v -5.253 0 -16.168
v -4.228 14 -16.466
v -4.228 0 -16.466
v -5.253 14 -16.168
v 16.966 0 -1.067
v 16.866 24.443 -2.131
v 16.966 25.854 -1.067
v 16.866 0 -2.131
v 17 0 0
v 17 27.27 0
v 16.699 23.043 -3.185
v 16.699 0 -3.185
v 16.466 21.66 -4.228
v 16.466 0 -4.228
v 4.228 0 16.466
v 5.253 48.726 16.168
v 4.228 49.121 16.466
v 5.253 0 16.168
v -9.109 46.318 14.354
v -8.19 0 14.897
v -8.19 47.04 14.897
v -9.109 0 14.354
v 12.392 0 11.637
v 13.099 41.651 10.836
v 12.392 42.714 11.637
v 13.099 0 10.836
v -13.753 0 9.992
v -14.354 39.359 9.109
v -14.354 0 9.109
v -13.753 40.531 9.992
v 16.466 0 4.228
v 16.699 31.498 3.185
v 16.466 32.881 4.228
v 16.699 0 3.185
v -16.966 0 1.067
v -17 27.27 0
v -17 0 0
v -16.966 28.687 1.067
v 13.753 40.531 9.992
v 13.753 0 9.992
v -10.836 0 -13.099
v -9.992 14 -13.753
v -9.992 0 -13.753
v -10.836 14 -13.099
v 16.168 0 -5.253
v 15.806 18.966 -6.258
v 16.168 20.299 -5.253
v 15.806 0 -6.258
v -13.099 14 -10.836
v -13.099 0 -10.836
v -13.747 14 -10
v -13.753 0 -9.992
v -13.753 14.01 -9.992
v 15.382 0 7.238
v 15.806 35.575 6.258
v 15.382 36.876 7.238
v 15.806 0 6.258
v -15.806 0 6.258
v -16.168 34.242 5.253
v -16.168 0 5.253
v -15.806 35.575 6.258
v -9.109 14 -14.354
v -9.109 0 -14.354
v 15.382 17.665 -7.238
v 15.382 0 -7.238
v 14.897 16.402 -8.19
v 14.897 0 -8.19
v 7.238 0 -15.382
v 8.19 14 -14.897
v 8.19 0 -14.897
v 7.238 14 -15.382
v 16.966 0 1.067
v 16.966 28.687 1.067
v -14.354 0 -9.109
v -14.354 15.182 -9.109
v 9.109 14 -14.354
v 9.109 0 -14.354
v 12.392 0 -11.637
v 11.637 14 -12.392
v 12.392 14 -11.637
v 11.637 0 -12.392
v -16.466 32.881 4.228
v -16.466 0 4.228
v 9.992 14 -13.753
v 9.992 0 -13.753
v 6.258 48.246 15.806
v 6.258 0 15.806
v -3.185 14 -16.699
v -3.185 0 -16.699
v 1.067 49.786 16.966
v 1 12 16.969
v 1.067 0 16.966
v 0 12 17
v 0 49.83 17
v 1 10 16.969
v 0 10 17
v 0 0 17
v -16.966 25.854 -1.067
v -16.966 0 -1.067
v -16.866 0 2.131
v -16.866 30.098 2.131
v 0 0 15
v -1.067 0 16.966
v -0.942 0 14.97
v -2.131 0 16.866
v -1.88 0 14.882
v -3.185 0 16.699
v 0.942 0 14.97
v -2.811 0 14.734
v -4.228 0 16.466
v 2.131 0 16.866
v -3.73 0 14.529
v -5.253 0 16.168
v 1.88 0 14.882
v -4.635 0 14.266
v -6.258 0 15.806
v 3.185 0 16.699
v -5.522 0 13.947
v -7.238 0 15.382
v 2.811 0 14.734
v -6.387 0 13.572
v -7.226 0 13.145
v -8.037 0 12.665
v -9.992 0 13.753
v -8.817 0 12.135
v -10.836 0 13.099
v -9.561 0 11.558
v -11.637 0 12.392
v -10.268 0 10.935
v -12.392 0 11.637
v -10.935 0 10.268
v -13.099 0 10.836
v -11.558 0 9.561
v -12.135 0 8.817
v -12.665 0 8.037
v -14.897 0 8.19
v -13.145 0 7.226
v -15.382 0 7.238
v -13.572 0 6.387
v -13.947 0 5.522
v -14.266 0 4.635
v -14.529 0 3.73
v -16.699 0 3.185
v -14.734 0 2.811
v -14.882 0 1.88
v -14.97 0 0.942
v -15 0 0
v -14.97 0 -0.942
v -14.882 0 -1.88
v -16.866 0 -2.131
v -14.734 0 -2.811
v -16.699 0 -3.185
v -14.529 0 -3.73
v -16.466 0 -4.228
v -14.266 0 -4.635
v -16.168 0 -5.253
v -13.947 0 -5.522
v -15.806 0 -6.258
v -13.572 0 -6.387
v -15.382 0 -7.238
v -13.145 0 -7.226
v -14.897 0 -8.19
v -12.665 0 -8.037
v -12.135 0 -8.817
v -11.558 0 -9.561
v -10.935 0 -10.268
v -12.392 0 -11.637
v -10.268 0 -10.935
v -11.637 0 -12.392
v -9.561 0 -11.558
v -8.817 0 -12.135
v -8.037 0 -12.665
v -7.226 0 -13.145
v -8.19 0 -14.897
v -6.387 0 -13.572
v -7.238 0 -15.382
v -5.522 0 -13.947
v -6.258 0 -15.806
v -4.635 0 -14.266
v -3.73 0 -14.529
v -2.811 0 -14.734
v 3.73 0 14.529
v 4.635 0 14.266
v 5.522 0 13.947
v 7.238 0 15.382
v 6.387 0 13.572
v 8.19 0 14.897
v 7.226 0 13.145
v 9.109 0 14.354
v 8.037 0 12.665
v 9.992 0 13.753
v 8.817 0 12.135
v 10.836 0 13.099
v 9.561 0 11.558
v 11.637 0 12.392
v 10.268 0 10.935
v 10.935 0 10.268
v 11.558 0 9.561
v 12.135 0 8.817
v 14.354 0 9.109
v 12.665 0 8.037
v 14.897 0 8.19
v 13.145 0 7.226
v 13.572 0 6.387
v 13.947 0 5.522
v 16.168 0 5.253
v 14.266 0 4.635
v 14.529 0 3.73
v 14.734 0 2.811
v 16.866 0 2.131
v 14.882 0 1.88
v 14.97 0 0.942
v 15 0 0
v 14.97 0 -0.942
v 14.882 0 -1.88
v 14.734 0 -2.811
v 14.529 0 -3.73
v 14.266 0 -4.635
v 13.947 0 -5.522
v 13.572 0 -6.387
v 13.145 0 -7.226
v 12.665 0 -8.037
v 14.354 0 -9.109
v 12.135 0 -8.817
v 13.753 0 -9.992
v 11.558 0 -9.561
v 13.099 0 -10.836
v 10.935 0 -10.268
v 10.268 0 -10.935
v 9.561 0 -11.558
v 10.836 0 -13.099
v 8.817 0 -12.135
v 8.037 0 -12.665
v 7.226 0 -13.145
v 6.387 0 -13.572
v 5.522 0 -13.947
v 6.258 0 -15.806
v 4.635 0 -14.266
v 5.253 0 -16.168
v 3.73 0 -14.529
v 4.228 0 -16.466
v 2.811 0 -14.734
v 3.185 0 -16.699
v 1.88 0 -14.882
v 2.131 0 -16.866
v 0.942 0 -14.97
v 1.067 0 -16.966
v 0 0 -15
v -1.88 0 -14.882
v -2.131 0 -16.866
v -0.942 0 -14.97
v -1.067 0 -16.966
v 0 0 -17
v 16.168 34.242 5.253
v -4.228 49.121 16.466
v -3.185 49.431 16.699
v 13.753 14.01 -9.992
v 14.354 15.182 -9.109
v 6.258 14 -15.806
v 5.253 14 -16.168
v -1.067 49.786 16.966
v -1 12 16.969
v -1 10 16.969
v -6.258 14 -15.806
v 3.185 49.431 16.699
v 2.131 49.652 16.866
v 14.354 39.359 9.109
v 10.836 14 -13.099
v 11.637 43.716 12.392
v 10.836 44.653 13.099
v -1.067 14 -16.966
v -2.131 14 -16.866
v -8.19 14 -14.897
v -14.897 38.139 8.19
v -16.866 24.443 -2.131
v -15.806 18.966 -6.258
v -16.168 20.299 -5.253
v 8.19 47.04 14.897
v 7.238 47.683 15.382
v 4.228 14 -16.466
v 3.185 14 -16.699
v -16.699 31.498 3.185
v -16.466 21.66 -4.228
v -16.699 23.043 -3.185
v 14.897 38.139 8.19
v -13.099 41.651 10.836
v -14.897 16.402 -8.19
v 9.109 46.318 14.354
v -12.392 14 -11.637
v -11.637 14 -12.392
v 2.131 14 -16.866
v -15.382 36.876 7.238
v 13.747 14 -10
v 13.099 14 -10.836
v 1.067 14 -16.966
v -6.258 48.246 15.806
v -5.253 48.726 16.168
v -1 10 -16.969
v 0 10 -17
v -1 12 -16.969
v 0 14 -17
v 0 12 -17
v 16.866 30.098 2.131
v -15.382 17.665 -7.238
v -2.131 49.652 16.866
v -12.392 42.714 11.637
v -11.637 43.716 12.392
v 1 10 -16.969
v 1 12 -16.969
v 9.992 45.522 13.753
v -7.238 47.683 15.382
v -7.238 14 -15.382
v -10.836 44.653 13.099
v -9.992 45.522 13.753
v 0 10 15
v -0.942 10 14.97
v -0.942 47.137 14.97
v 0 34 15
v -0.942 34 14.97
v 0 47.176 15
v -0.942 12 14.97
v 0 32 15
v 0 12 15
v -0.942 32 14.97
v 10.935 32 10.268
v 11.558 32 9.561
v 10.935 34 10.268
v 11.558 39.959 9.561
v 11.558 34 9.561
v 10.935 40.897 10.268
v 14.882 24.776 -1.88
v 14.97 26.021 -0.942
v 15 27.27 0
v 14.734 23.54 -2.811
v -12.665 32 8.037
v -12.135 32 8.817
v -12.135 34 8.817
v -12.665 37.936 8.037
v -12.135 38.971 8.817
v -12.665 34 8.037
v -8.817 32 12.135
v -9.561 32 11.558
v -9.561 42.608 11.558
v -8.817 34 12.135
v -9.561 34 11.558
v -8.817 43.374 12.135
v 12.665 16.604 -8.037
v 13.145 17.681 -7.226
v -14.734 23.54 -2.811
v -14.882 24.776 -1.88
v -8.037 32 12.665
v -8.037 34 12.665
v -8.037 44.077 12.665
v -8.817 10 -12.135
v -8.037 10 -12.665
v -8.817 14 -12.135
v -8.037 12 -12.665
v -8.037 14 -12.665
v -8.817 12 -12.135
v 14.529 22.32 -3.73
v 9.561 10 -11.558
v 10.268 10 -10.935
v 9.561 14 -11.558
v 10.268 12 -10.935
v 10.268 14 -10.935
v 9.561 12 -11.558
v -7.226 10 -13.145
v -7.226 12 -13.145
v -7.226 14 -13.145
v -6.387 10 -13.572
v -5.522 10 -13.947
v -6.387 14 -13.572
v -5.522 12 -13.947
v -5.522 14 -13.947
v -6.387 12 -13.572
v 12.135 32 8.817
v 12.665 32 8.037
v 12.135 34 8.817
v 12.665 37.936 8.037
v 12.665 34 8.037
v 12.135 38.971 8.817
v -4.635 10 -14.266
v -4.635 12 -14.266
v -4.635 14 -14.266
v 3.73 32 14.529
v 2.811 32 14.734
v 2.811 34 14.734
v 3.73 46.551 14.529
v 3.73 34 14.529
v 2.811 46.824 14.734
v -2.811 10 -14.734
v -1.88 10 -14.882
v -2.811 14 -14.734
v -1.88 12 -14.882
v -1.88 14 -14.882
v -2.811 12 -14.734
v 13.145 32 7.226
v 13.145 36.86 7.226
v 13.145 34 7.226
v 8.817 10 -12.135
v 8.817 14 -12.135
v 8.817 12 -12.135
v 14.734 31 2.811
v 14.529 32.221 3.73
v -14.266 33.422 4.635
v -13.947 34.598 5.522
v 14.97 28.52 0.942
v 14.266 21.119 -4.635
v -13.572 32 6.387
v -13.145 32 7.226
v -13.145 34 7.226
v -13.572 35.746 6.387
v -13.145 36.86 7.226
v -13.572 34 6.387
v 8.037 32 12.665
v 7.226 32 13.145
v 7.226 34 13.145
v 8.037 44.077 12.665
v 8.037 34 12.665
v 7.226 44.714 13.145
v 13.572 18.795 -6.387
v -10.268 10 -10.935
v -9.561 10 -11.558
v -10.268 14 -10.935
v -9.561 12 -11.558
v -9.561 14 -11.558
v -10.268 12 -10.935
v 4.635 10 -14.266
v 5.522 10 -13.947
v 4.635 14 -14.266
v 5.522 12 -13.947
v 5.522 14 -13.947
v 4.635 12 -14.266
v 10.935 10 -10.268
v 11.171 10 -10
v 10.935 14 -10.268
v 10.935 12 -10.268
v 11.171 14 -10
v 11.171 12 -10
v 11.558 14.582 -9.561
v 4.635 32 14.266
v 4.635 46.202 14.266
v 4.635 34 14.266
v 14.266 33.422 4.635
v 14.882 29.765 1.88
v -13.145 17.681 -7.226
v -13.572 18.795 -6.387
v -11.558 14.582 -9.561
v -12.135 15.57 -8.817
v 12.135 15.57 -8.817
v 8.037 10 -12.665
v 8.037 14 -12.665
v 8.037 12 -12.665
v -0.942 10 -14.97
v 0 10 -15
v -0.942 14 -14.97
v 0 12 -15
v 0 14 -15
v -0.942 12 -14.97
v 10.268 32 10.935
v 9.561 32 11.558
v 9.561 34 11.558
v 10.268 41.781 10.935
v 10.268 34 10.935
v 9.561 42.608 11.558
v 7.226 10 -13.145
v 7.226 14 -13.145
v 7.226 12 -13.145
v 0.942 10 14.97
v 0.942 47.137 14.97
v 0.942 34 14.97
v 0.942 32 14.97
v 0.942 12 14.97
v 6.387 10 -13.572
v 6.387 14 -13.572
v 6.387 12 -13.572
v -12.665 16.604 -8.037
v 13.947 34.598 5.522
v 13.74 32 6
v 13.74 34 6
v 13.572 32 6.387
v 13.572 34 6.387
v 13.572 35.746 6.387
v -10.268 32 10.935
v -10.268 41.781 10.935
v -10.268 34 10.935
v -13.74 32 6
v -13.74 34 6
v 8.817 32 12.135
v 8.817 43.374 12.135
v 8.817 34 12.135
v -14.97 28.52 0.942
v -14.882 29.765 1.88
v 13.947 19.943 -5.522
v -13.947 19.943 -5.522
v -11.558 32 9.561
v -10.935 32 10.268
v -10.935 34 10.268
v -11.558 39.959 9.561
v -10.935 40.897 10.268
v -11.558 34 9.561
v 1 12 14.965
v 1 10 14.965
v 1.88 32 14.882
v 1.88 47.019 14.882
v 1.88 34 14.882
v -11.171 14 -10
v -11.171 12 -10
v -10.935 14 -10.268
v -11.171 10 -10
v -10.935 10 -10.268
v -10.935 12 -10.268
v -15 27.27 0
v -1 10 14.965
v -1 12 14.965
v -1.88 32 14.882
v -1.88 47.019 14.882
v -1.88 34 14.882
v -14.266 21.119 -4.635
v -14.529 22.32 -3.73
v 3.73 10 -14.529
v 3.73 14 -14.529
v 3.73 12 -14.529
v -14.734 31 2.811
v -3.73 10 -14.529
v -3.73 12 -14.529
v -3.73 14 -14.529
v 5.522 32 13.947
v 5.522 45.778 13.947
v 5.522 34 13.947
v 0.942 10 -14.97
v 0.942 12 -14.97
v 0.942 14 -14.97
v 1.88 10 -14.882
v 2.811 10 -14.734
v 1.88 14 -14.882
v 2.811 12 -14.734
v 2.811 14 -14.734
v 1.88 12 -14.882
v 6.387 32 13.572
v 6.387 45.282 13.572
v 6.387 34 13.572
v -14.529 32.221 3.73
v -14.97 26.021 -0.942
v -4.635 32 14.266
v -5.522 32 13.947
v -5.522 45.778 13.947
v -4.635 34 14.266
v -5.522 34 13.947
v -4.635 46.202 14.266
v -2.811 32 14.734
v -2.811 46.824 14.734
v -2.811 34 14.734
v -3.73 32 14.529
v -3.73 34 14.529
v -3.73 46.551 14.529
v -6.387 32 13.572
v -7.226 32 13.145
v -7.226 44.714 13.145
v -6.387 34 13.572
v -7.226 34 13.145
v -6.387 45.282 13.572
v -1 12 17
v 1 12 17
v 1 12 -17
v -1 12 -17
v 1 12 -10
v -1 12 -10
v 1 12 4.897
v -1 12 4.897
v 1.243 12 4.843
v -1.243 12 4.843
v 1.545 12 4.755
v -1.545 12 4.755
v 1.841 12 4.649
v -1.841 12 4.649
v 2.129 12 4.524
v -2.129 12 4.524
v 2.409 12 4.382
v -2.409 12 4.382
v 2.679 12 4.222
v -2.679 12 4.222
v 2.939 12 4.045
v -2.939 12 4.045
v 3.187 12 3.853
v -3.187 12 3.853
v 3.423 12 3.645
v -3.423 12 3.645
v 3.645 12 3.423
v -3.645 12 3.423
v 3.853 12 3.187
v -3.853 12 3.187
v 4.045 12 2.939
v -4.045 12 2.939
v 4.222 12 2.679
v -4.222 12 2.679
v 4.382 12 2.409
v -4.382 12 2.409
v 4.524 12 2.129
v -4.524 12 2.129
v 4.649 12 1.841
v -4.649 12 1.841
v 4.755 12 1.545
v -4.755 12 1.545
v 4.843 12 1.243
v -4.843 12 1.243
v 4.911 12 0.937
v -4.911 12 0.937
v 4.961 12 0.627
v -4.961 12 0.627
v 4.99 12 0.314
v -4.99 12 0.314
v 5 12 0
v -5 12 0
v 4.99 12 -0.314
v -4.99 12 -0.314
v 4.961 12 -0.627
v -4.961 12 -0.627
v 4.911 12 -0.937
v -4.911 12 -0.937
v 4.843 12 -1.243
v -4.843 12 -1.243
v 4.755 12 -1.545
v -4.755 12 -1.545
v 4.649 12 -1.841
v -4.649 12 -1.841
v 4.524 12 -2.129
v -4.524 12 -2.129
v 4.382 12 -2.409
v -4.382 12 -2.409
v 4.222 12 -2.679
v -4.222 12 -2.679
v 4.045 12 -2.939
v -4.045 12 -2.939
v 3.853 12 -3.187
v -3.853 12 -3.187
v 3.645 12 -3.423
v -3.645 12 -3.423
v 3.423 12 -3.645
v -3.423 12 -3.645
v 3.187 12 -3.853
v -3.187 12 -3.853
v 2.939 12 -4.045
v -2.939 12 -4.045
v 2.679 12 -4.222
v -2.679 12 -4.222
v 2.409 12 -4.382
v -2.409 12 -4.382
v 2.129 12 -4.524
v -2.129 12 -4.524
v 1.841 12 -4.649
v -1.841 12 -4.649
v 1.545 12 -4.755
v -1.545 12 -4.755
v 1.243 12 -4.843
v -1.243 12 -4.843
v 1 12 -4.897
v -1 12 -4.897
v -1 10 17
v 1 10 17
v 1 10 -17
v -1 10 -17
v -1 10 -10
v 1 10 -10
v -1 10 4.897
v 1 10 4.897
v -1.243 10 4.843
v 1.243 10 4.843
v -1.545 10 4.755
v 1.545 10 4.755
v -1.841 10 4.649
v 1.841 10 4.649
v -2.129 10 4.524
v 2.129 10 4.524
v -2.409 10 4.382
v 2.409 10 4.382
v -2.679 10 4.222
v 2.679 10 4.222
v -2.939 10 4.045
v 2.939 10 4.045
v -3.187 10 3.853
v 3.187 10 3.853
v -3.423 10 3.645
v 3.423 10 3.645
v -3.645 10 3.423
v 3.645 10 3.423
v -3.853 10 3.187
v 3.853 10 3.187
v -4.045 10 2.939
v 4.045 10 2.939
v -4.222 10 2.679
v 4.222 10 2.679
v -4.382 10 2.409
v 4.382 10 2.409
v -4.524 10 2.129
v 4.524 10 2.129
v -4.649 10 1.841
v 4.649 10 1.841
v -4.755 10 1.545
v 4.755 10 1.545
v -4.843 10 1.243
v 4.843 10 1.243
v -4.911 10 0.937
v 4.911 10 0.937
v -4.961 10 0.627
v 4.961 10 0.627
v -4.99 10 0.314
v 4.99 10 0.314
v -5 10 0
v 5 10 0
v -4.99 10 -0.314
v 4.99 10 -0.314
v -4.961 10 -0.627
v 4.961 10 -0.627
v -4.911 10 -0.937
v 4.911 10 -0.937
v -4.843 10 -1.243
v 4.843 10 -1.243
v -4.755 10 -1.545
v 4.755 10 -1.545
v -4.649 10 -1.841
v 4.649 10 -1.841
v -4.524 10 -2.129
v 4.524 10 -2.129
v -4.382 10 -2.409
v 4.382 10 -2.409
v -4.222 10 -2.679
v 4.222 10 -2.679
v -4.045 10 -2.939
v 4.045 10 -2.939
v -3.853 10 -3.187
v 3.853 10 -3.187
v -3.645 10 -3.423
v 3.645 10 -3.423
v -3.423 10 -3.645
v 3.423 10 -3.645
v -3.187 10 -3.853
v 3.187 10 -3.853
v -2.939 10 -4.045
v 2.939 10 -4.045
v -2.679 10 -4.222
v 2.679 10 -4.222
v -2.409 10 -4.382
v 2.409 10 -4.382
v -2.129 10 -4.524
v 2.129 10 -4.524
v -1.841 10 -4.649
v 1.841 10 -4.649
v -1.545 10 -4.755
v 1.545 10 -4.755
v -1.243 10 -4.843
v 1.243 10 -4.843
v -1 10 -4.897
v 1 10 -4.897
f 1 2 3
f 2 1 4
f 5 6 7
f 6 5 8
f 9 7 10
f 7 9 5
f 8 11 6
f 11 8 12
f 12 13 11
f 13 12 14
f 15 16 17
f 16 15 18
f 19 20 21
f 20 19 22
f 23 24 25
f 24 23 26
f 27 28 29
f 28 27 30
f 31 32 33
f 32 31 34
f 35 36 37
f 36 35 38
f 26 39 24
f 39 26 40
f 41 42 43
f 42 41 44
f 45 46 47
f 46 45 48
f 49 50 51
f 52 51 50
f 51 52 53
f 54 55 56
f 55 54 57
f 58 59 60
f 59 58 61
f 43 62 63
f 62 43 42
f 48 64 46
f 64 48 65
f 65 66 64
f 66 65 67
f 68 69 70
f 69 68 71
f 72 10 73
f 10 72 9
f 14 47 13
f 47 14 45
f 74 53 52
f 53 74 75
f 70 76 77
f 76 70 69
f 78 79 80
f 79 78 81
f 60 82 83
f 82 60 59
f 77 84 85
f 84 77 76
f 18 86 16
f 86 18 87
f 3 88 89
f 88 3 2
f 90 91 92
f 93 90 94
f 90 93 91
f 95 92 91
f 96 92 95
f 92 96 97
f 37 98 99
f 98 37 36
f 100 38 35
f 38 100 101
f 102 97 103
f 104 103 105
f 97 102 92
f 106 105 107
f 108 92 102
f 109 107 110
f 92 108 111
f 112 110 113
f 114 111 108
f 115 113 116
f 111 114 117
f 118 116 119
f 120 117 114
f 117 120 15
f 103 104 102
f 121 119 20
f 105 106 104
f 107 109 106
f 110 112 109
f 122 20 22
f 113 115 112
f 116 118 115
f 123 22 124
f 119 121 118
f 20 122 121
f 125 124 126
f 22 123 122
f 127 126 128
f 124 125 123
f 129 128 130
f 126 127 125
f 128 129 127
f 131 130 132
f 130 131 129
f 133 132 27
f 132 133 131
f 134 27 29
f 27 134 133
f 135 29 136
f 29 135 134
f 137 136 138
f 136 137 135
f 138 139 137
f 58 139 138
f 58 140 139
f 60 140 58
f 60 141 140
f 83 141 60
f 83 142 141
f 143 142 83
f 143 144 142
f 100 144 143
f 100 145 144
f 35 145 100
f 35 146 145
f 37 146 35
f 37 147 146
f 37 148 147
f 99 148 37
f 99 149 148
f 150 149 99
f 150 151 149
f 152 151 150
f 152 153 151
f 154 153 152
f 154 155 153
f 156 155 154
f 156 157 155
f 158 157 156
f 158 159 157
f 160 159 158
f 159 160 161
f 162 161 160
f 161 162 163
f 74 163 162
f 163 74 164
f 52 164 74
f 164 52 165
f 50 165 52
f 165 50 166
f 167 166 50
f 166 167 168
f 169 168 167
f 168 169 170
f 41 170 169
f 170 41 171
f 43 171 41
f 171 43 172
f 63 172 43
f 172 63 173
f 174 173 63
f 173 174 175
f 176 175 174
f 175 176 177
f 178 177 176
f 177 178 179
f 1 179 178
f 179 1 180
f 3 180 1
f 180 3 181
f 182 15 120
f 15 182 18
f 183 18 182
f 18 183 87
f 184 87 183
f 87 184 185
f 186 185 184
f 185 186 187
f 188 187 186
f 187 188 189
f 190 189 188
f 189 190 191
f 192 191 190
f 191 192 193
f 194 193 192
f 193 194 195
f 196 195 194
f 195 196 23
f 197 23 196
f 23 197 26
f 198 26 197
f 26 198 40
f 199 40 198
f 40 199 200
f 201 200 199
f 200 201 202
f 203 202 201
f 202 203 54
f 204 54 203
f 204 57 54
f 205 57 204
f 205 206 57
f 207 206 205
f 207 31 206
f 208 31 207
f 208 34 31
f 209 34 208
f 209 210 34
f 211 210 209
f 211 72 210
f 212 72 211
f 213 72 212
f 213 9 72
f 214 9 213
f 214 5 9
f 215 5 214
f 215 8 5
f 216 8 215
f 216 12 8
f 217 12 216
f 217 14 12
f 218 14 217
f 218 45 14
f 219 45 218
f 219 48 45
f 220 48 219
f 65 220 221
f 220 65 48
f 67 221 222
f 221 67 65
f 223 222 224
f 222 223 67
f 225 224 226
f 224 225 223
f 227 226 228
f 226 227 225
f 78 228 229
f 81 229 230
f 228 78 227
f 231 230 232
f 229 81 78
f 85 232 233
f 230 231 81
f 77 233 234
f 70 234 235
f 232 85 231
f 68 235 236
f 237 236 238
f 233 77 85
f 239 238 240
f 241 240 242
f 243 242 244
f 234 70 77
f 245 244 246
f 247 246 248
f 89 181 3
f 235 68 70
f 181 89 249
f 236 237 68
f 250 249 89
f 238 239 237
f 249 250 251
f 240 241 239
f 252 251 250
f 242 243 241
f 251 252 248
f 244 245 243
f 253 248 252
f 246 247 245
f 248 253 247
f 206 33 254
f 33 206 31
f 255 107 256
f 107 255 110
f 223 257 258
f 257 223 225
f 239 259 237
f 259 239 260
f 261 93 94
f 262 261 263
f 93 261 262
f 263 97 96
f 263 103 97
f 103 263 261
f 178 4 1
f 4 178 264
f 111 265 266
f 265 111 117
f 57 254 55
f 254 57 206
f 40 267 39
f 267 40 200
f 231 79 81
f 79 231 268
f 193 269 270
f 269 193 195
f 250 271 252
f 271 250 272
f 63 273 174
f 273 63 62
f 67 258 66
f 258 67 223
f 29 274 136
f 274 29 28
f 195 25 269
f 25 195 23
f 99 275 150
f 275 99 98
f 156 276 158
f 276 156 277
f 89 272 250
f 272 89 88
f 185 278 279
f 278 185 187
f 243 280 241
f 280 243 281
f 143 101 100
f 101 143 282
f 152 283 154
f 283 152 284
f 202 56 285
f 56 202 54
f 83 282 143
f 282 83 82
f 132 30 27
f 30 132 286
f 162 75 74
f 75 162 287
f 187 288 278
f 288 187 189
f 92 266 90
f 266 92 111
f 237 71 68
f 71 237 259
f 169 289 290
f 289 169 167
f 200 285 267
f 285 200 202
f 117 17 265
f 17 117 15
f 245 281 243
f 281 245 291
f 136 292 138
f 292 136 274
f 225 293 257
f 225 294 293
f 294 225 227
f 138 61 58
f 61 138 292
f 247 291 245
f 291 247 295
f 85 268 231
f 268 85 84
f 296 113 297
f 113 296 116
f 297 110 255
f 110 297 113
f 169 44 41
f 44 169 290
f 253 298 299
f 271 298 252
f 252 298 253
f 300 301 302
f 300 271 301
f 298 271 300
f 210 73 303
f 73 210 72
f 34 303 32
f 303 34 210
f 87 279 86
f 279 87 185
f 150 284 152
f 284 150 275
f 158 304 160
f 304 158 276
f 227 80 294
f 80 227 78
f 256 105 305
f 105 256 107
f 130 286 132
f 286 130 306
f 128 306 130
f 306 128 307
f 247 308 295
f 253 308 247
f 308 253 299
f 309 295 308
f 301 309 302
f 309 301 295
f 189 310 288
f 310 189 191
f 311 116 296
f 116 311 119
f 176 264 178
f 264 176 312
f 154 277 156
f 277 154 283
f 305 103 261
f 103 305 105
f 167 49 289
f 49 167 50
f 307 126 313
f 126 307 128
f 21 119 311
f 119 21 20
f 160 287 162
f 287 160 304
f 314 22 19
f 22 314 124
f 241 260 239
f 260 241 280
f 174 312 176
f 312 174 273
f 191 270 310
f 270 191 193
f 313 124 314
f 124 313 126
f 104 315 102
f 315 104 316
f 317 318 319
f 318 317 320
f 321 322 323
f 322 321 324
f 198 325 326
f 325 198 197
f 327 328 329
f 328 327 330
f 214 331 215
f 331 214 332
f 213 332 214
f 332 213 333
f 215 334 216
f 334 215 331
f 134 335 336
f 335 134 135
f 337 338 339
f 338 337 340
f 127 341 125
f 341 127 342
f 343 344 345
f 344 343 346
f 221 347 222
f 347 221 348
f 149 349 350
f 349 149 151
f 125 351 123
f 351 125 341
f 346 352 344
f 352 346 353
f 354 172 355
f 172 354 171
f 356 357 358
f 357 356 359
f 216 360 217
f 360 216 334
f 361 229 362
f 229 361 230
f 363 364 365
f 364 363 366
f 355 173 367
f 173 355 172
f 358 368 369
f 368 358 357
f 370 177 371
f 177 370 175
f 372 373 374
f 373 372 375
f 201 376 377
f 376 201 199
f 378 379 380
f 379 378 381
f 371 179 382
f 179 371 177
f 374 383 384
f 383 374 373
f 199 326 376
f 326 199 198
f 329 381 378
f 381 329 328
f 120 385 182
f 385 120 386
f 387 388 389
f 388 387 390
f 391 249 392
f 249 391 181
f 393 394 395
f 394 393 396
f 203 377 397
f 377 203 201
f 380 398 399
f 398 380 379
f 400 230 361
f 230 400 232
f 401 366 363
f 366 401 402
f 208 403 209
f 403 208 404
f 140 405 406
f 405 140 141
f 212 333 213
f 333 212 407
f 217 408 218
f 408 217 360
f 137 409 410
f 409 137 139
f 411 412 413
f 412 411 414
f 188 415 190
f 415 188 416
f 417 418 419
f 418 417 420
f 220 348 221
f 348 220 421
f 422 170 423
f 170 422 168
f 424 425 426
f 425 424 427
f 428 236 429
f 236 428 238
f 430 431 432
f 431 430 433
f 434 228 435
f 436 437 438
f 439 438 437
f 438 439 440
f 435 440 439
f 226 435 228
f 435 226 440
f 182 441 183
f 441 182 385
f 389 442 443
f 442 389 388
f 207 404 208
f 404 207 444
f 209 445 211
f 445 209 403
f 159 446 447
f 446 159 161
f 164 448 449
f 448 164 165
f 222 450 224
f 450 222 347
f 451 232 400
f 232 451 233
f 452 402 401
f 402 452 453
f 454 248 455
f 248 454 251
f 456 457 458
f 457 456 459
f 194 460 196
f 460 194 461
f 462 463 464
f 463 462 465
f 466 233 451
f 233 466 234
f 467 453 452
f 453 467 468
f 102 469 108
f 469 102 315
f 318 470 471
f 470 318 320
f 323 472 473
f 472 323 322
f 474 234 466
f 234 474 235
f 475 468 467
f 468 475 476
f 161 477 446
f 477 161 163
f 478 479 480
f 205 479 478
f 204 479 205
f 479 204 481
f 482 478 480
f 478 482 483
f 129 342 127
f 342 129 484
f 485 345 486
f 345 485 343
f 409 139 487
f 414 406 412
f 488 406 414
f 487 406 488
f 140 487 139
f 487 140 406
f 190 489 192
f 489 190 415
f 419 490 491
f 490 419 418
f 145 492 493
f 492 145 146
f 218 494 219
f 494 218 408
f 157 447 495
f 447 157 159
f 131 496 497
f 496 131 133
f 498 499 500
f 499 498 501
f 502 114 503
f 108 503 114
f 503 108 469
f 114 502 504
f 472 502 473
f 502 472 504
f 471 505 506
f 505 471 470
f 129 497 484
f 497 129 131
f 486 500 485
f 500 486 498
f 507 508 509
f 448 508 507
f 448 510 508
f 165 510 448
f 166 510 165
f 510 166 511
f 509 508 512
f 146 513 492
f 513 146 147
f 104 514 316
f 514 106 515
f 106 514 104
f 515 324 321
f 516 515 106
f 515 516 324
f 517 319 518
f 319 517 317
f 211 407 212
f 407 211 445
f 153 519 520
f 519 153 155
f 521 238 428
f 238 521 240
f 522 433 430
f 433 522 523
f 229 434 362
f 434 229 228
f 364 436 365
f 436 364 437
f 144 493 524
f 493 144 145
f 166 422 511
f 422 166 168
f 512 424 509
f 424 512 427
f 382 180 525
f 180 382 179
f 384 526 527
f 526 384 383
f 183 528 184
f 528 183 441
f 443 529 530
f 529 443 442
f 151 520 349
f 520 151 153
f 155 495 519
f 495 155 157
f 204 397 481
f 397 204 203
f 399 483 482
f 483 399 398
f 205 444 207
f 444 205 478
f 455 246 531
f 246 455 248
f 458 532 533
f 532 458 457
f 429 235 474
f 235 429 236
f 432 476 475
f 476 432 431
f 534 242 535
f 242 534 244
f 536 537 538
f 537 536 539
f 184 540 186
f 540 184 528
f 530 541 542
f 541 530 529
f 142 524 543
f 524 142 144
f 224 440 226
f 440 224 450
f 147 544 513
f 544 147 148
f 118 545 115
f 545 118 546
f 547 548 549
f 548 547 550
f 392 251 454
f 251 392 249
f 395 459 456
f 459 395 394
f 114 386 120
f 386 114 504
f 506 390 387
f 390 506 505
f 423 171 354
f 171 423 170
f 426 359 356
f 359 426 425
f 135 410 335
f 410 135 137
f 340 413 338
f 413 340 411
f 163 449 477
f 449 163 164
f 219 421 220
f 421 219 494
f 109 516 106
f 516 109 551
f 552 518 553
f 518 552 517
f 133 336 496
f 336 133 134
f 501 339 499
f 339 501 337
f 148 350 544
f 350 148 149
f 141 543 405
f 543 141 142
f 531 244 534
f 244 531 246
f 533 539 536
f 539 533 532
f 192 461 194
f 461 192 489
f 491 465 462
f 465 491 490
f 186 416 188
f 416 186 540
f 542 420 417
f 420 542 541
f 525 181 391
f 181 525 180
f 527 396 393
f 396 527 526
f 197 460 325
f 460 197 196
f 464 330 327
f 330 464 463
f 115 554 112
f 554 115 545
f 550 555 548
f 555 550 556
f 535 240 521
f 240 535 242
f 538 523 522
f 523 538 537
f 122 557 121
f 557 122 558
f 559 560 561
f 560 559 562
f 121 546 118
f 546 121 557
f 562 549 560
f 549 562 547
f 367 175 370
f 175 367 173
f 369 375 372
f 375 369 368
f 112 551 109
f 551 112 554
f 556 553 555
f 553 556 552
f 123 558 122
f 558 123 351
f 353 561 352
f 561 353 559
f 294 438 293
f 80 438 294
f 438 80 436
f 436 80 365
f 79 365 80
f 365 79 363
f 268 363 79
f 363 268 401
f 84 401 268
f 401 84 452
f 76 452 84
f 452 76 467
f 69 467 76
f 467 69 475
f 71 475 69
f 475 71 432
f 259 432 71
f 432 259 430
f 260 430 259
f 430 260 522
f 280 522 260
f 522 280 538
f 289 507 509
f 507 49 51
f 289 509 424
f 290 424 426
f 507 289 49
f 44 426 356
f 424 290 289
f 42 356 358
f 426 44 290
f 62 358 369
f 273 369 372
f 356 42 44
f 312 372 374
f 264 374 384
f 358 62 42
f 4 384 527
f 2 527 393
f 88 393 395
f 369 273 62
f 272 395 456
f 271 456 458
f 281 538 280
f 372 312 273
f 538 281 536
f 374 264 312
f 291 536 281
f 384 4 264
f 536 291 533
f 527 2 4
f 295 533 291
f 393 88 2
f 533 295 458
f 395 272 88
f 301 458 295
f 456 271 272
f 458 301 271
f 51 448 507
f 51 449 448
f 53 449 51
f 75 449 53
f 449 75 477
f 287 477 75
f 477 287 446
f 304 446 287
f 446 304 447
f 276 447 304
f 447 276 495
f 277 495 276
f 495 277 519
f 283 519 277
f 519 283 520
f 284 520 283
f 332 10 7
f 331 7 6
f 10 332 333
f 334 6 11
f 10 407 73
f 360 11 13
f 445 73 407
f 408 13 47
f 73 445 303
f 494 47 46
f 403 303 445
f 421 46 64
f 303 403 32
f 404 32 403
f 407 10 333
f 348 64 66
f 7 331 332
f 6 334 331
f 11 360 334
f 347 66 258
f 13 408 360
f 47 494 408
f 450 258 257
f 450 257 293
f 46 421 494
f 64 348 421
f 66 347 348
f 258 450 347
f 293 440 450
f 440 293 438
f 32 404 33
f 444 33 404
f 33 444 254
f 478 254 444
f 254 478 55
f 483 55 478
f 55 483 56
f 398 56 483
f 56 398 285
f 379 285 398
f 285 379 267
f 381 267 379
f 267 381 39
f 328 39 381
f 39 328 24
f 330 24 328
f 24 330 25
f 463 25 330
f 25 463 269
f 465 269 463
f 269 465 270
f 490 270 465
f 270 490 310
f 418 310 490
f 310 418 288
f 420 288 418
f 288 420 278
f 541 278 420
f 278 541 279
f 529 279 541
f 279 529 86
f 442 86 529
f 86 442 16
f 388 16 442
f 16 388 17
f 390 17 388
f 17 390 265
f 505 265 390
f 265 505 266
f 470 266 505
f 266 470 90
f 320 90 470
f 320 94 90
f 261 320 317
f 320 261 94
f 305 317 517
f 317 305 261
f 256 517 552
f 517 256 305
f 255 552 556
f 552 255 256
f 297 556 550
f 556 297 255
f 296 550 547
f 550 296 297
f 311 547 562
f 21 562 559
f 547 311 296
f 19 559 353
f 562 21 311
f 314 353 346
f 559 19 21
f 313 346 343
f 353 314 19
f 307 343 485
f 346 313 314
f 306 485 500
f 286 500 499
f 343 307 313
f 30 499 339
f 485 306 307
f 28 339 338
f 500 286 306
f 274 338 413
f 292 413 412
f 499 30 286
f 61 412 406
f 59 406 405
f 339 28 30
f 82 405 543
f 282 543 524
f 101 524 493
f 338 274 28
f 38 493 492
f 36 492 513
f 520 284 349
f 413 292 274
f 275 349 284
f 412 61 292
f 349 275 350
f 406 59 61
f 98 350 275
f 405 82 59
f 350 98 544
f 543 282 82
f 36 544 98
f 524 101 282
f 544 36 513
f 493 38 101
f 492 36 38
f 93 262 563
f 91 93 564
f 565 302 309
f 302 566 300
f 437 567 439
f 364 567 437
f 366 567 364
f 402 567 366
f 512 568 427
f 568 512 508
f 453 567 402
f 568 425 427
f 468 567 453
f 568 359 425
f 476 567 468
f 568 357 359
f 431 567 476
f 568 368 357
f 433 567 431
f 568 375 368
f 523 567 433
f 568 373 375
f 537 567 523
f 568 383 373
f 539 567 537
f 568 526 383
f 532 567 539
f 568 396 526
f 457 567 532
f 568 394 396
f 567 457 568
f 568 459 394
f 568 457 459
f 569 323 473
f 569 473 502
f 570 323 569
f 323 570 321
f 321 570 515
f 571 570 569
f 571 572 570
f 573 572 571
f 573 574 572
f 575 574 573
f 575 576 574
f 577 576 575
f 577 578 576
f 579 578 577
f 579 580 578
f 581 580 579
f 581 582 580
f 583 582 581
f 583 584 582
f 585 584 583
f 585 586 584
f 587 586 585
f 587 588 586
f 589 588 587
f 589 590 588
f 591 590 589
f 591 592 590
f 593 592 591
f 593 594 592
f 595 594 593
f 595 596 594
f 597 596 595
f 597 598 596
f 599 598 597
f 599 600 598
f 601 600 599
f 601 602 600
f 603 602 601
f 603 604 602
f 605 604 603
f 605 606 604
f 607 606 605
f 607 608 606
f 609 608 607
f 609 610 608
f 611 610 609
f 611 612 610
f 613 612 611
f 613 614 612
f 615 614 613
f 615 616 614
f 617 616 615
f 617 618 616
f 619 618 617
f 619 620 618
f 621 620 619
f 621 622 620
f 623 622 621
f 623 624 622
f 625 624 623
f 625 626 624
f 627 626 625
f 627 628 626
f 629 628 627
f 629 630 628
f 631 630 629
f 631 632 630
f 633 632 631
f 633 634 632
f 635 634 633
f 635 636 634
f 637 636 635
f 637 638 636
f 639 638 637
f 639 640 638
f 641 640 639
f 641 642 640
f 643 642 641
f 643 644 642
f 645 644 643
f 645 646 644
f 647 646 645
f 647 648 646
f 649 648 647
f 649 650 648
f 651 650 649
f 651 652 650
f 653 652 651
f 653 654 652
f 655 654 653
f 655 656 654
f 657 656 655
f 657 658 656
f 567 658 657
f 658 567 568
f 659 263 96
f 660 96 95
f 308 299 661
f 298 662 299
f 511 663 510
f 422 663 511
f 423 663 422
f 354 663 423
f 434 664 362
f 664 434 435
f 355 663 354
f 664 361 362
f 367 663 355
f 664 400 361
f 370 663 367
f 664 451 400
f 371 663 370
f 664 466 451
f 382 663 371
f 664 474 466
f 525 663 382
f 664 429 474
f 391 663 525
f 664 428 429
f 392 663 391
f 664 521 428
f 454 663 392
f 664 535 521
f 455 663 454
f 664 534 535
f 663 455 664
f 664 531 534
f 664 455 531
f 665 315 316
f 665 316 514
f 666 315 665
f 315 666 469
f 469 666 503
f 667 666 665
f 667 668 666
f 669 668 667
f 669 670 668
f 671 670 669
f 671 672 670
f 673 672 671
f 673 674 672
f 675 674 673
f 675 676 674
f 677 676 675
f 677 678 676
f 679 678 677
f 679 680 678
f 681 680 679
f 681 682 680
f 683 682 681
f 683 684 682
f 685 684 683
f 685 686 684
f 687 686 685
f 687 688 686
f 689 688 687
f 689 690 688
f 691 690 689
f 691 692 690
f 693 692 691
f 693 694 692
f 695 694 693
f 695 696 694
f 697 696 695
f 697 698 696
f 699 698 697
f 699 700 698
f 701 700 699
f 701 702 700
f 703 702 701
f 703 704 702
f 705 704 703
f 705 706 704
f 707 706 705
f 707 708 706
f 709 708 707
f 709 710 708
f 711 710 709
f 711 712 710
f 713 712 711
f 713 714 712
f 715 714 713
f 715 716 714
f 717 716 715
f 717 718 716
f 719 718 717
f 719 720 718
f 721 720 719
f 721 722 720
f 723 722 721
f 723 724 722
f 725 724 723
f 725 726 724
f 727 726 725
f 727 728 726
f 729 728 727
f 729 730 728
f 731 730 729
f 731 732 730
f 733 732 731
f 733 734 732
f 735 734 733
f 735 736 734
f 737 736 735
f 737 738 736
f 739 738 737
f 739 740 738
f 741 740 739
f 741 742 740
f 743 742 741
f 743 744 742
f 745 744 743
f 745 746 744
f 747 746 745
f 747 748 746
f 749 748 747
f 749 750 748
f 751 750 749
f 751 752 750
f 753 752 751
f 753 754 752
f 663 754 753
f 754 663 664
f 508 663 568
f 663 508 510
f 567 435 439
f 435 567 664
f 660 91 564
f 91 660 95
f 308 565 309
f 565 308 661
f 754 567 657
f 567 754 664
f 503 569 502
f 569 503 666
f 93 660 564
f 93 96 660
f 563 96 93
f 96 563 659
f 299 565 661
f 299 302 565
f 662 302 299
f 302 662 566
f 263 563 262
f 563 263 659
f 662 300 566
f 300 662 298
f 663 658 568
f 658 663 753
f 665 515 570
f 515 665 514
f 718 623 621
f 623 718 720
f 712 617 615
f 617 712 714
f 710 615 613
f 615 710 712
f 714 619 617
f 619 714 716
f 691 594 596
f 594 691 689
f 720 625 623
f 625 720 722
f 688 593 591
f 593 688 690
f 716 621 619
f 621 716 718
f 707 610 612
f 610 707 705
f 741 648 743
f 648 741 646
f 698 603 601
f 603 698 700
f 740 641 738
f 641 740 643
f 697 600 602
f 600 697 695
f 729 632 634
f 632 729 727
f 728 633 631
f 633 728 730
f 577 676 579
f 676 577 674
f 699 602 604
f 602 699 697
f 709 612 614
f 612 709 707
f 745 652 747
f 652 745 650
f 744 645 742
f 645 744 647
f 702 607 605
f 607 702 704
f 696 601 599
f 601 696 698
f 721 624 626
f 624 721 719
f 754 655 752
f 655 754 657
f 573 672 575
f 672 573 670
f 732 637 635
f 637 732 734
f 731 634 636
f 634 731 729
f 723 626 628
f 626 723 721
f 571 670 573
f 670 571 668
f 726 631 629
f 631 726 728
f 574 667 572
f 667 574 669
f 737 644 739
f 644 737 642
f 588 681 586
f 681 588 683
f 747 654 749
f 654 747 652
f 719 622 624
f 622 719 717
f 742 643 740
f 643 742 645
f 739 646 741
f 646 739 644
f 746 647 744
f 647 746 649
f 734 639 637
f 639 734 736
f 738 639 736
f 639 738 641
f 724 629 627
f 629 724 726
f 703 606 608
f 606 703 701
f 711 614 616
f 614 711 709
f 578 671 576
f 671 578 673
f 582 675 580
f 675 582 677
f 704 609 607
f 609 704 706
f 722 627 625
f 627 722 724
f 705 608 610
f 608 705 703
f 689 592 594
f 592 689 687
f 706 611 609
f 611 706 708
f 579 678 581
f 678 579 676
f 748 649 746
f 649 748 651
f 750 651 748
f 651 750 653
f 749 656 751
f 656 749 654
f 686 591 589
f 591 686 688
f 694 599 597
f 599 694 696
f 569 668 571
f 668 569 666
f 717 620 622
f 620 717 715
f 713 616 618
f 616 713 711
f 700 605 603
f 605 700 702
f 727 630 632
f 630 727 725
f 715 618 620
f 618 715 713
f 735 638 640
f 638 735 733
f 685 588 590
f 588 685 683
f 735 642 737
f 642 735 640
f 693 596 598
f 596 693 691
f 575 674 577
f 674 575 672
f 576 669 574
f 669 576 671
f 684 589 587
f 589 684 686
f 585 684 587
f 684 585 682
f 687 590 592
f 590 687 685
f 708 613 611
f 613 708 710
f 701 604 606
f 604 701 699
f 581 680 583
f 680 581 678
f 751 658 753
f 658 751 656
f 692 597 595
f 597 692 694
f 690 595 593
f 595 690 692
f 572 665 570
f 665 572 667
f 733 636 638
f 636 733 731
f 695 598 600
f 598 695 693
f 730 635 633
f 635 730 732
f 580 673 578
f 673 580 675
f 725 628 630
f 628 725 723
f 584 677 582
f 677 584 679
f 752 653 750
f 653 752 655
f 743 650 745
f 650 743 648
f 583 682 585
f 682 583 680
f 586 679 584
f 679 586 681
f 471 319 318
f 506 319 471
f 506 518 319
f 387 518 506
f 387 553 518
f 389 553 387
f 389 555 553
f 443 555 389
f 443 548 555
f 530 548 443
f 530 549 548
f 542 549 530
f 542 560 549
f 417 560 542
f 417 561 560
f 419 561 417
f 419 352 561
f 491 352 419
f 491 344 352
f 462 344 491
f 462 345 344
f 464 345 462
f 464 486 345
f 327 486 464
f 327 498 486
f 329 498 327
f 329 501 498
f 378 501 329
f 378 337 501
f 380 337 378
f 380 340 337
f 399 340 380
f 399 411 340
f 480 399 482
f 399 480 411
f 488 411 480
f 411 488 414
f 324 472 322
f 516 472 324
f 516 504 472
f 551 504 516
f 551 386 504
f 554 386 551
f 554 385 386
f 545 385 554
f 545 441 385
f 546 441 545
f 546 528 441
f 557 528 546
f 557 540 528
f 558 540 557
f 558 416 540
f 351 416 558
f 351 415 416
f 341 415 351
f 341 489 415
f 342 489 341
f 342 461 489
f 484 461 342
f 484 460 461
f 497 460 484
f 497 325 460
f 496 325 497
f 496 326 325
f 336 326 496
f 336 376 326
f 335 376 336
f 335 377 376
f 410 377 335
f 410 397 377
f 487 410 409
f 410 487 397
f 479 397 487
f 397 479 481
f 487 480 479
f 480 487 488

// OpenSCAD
//
// ktRACK95
//
//

gap1 = 0.001;
gap2 = 0.003;
th = 2;




//base();
awning();


module awning()
{
difference()
{

    union()
    {
        translate([0, 0, 0]) rotate([-90, 0, 0]) cylinder(h=50, r=(30+th*2)/2, $fn=100);
    }
    translate([0, -30, 0]) rotate([-90, 0, 0]) cylinder(h=100, r=30/2, $fn=100);
    
    translate([-100/2, 14, -10]) rotate([-90   , 0, 0]) cube([100, 100, 100]);
    translate([-100/2, 14, -10]) rotate([-90+37, 0, 0]) cube([100, 100, 100]);
}
difference()
{

    union()
    {
        translate([0, 14-th-2, 0]) rotate([-90, 0, 0]) cylinder(h=2, r=(30+th*2)/2, $fn=100);
    }
    
    translate([-100/2, 0, -10]) cube([100, 100, 100]);
}
difference()
{

    union()
    {
        translate([-2/2, 14-th-2, -(30+th*2)/2]) cube([2, 2, (30+th*2)]);
        translate([0, 14-th-2, 0]) rotate([-90, 0, 0]) cylinder(h=2, r=10/2, $fn=100);
    }
}
difference()
{

    union()
    {
        translate([0, 32, 0]) rotate([-90, 0, 0]) cylinder(h=2, r=(30+th*2)/2, $fn=100);
    }
    
    translate([-100/2, 0, -100+6]) cube([100, 100, 100]);
}
}


module base()
{
difference()
{

    union()
    {
        translate([-(16.8+3)/2+1, -6, 10]) rotate([180, 0, 180-(55+8.4)]) cube([17.8, 4, 10]);
        translate([-13.1-1.5, 2+9.2, 0]) cylinder(h=10, r=(3+2)/2, $fn=100);
        translate([-(16.8+3)/2, 0, 10]) rotate([180, 0, 180-55]) cube([11-1, 5, 10]);
        translate([-(16.8+3)/2, 0, 0]) cube([16.8+3, 5, 10]);
        translate([ (16.8+3)/2, 0, 0]) rotate([0, 0, 55]) cube([11-1, 5, 10]);
        translate([13.1+1.5, 2+9.2, 0]) cylinder(h=10, r=(3+2.2)/2, $fn=100);
        translate([ (16.8+3)/2-1, -6, 0]) rotate([0, 0, 55+8.4]) cube([17.8, 4, 10]);

        translate([-18/2, -10/2, 10/2]) rotate([0, 90, 0]) cylinder(h=18, r=10/2, $fn=100);
        translate([-18/2, -5, 0]) cube([18, 5, 10]);
        translate([-18/2, -10, 0]) cube([18, 10, 5]);

    }
    translate([0, 0, 0]) cover();
    
    #translate([-(18+15)/2, -10/2, -18/2+1]) rotate([0, 90, 0]) cylinder(h=18+15, r=18/2, $fn=100);

    #translate([ (16.8+3)/2-2, 0, -3]) rotate([20, -40, 0]) cube([4, 2, 30]);
}
}

module cover()
{
difference()
{

    union()
    {
        translate([-(16.8+3)/2, 2, 17]) rotate([180, 0, 180-55]) cube([11-2, 2+10, 17]);
        translate([-(16.8+3)/2, 2, 17]) rotate([180, 0, 180-55]) cube([11, 2, 17]);
        translate([-(16.8+3)/2, 2, 0]) cube([16.8+3, 2+10, 17]);
        translate([ (16.8+3)/2, 2, 0]) rotate([0, 0, 55]) cube([11, 2, 17]);
        translate([ (16.8+3)/2, 2, 0]) rotate([0, 0, 55]) cube([11-2, 2+10, 17]);

        translate([-13.1-1.5, 2+9.2, 0]) cylinder(h=17, r=3/2, $fn=100);
        translate([13.1+1.5, 2+9.2, 0]) cylinder(h=17, r=3/2, $fn=100);
    }

}
}
